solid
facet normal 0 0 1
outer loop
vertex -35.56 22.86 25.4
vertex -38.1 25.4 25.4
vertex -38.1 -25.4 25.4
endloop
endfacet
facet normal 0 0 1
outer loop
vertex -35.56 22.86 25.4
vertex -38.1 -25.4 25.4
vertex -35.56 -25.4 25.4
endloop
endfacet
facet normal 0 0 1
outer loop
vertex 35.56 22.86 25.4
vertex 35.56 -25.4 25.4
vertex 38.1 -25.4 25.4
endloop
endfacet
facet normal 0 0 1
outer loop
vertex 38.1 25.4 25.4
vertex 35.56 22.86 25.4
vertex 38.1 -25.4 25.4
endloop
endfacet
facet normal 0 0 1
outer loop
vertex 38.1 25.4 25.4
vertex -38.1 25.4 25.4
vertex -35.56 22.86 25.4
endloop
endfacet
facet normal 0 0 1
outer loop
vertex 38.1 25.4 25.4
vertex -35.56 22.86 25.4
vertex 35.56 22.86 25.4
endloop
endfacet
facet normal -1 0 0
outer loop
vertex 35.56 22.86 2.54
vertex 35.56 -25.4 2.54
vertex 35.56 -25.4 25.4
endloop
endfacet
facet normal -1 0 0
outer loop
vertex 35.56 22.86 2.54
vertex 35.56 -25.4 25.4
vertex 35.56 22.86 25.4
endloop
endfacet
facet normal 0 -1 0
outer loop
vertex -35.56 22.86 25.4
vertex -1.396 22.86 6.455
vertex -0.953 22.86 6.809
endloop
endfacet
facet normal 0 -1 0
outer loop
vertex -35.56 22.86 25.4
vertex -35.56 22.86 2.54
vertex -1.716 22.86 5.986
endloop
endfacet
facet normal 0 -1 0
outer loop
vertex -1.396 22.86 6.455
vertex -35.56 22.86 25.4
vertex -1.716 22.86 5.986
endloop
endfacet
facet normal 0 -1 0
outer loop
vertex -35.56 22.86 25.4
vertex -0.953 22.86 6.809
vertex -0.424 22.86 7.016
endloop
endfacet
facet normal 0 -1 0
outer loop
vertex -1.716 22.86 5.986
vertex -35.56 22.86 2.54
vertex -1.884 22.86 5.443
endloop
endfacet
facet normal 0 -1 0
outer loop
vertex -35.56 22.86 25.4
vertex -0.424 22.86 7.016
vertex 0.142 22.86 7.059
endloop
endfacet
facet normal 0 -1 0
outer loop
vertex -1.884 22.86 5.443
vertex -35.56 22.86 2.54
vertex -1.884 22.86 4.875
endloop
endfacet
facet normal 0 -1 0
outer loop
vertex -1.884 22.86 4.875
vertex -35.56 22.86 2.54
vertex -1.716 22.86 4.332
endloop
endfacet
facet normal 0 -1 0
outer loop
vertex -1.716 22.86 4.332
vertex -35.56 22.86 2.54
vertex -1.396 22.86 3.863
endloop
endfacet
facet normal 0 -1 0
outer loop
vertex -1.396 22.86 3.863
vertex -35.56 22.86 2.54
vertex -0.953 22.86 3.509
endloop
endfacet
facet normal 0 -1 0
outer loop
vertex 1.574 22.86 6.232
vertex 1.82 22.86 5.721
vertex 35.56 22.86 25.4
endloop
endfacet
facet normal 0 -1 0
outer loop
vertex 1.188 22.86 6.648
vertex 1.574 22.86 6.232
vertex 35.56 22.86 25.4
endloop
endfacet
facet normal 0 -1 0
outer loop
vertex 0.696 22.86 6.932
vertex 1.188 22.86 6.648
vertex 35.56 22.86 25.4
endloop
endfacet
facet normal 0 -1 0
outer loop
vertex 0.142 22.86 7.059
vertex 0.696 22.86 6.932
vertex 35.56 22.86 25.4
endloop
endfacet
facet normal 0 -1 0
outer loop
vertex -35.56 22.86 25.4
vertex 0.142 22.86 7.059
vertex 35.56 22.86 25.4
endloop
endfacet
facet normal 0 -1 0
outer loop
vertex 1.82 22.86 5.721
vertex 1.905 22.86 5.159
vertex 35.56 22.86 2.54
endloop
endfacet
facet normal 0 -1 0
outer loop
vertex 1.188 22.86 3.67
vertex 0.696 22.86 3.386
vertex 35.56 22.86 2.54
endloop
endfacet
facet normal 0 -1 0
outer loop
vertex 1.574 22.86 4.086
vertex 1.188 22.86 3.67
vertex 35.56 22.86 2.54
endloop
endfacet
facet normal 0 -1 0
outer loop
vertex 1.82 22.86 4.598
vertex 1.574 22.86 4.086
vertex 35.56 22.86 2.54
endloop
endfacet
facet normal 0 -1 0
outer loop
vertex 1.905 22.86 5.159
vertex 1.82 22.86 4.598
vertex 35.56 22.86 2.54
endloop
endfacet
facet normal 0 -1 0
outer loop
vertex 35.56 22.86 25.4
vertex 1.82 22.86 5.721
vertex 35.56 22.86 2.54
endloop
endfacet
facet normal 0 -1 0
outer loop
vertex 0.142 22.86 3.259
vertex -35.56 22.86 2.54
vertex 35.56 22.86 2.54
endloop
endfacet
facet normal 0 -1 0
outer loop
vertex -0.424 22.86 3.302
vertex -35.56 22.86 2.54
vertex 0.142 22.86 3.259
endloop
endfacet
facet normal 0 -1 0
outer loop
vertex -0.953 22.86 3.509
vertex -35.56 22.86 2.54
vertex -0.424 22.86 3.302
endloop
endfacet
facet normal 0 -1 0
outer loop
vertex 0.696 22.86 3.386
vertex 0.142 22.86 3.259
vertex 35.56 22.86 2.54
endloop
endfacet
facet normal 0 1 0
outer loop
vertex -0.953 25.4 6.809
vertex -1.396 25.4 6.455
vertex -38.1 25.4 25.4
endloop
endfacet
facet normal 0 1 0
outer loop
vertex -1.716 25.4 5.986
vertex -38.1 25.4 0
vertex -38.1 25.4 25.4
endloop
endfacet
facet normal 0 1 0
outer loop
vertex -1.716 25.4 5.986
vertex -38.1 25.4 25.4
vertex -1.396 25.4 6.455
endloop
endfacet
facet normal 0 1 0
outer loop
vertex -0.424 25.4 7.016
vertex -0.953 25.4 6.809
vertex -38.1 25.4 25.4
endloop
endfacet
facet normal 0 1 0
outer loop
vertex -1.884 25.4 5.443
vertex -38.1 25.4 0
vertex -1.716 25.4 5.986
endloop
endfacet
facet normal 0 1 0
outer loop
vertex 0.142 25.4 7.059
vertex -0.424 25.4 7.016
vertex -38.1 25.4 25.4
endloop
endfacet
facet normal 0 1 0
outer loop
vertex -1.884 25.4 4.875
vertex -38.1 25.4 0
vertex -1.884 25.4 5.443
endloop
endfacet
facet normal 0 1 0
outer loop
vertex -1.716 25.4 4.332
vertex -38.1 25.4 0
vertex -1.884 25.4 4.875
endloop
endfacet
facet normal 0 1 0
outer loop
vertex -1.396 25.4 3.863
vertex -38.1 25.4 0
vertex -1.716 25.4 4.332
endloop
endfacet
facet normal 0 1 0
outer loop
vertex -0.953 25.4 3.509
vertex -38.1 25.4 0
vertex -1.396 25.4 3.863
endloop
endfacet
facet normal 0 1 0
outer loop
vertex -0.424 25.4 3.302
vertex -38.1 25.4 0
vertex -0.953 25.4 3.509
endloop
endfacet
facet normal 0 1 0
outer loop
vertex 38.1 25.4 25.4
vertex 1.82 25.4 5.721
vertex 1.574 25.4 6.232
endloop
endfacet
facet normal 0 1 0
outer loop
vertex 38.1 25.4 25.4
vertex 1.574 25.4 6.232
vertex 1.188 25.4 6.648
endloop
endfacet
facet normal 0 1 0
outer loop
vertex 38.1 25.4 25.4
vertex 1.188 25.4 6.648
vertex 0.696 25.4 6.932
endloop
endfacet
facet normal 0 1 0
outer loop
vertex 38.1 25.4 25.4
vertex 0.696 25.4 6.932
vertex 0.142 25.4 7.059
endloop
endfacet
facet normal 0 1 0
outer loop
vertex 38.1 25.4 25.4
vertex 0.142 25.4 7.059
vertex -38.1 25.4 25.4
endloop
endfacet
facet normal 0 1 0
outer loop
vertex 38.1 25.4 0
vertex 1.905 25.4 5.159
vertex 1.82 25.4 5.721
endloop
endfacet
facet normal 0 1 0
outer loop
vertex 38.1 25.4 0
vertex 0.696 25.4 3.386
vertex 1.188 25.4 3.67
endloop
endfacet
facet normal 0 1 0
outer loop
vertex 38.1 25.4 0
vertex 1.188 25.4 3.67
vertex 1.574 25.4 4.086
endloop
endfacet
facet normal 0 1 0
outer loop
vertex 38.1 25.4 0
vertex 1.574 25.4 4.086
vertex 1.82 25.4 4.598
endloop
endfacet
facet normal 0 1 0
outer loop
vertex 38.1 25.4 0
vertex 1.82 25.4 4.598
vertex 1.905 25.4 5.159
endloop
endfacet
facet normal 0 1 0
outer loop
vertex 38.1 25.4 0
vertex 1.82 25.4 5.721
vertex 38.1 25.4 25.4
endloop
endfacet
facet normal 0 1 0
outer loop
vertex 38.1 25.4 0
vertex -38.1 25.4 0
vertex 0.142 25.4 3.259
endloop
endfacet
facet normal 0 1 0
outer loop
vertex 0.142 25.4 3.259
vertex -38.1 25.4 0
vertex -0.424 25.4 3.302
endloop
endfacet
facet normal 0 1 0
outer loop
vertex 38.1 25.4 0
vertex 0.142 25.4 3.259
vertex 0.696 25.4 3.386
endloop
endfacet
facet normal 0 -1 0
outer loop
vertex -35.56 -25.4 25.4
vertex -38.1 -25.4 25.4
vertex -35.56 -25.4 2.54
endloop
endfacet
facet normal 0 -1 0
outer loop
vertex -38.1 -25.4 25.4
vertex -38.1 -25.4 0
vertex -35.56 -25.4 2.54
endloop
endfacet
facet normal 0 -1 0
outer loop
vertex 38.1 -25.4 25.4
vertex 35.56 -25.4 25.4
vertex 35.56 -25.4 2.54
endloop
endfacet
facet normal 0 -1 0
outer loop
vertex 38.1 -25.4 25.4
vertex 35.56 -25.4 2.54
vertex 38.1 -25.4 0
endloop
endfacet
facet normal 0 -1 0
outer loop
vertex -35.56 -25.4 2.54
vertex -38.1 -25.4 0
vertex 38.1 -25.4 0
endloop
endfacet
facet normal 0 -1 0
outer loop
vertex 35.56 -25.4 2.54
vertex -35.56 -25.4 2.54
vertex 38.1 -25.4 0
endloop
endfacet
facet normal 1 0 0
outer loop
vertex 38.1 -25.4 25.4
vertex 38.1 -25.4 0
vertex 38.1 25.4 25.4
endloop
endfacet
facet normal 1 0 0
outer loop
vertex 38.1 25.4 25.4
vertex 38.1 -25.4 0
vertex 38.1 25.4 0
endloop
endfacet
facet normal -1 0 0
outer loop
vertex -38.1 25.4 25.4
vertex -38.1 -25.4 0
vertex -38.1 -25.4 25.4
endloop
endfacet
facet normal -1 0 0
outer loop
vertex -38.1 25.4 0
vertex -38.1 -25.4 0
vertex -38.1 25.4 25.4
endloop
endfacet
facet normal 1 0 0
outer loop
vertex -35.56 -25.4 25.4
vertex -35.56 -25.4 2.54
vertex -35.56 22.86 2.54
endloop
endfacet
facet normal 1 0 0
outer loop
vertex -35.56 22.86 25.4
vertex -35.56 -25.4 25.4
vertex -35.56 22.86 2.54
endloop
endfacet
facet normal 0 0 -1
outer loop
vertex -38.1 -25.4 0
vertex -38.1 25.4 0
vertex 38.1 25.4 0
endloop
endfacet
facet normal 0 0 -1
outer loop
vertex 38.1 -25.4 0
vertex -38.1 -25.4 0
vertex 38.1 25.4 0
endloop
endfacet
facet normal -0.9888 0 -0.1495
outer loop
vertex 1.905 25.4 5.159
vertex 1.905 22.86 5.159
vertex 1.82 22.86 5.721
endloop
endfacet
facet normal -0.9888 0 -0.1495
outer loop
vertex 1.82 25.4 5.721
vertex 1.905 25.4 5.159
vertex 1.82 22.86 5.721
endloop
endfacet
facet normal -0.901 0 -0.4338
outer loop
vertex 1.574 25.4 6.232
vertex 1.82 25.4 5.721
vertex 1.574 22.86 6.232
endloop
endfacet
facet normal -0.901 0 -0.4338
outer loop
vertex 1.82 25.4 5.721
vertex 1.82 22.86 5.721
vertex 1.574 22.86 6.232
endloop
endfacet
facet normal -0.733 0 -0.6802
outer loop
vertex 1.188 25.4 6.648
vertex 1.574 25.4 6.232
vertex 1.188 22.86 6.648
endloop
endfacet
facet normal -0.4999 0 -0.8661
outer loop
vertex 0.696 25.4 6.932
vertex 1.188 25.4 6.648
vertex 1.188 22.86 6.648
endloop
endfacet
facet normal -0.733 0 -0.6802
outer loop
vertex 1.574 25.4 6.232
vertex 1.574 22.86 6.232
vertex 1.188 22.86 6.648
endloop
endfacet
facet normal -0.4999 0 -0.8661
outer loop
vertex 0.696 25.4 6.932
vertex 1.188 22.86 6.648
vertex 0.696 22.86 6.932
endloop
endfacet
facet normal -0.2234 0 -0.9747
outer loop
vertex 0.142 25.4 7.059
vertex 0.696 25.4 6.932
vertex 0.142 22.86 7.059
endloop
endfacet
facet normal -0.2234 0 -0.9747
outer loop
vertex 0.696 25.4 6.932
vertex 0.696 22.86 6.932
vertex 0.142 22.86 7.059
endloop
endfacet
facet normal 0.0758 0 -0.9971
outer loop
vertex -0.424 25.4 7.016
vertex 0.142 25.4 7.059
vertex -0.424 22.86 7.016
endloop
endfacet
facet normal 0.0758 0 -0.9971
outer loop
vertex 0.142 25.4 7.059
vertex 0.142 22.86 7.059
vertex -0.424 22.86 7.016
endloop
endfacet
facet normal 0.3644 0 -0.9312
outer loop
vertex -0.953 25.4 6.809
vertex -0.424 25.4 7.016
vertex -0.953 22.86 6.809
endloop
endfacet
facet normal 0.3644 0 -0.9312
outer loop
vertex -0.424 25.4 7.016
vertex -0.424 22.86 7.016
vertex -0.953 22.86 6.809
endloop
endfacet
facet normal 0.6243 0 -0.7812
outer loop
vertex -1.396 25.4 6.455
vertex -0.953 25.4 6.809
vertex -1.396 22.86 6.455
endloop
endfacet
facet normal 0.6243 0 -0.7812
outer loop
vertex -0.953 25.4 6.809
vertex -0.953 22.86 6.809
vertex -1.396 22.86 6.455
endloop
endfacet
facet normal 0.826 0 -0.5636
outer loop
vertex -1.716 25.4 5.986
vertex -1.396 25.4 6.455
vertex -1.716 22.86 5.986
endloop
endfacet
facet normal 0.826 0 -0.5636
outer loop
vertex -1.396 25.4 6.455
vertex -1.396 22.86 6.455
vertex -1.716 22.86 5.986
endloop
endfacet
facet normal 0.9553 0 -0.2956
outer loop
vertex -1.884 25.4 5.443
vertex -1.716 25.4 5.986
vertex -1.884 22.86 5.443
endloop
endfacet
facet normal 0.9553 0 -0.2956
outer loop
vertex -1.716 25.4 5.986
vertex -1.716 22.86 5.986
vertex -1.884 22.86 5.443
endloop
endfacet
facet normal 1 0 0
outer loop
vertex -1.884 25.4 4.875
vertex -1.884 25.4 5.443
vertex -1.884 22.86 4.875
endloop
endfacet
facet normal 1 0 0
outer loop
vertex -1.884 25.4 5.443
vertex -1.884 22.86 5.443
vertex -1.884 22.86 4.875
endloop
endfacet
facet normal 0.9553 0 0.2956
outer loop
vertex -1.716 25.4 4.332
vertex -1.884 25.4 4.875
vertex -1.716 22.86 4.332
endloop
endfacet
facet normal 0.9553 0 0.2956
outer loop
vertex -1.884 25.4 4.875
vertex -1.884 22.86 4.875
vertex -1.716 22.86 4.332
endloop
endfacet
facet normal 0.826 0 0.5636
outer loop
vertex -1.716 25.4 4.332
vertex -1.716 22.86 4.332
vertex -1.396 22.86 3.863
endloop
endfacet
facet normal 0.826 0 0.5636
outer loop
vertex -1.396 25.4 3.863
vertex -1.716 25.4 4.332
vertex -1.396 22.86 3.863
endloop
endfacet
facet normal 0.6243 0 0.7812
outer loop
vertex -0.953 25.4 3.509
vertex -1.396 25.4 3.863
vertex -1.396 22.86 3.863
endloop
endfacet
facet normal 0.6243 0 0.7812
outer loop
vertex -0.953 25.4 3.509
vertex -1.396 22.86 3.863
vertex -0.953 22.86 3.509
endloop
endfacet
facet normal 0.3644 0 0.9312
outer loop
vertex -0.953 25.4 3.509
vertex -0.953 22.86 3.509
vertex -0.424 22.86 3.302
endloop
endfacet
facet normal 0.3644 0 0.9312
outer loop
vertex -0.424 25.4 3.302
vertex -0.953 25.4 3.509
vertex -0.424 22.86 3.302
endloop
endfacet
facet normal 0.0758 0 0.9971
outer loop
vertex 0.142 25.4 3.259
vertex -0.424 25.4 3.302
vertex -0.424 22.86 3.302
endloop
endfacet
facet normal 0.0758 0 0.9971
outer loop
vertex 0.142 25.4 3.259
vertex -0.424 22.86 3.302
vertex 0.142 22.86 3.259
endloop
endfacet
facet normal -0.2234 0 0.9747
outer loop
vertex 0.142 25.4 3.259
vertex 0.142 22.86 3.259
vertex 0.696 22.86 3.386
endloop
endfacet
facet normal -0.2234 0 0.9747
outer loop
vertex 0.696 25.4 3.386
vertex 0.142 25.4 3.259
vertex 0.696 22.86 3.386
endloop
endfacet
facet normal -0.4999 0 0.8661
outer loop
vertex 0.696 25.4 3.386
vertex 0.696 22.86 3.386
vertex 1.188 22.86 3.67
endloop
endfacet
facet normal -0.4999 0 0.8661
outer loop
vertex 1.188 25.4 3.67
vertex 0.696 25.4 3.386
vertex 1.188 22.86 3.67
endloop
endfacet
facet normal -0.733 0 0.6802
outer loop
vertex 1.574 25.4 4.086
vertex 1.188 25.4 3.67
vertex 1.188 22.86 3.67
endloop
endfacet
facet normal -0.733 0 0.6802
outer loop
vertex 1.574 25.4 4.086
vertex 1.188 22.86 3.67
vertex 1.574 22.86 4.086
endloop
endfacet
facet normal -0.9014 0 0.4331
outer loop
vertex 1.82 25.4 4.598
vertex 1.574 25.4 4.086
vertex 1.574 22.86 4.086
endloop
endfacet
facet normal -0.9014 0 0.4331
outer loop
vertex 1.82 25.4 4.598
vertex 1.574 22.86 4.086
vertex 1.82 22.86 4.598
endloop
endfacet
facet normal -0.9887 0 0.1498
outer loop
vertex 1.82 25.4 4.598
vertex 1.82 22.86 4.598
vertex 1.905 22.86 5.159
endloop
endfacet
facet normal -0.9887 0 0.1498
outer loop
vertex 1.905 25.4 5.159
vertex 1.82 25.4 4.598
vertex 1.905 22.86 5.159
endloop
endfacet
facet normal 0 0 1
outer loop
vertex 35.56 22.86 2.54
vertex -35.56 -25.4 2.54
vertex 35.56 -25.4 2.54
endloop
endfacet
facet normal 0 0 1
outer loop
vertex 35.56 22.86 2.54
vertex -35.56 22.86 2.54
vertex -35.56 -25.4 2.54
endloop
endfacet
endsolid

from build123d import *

# Parameters (mm, degrees)
F0_W     = 76.2
F0_H     = 50.8
F1_DEPTH = 25.4
F2_T     = -2.54
F4_D     = 3.81


with BuildPart() as f1:
    # F0 (on Top) → F1 (new body)
    with BuildSketch(Plane.XY):
        Rectangle(F0_W, F0_H)
    extrude(amount=F1_DEPTH)

    # F2
    f2_openings = [f1.faces().sort_by_distance(p)[0] for p in [
        (0, 0, 25.4),
        (0, -25.4, 12.7),
    ]]
    offset(amount=F2_T, openings=f2_openings)

    # F4 (through all)
    with Locations(Plane(origin=(0, 25.4, 0), x_dir=(-1, 0, 0), z_dir=(0, 1, 0))):
        with Locations((0, 5.159016)):
            Hole(F4_D / 2)


solid = f1.part
